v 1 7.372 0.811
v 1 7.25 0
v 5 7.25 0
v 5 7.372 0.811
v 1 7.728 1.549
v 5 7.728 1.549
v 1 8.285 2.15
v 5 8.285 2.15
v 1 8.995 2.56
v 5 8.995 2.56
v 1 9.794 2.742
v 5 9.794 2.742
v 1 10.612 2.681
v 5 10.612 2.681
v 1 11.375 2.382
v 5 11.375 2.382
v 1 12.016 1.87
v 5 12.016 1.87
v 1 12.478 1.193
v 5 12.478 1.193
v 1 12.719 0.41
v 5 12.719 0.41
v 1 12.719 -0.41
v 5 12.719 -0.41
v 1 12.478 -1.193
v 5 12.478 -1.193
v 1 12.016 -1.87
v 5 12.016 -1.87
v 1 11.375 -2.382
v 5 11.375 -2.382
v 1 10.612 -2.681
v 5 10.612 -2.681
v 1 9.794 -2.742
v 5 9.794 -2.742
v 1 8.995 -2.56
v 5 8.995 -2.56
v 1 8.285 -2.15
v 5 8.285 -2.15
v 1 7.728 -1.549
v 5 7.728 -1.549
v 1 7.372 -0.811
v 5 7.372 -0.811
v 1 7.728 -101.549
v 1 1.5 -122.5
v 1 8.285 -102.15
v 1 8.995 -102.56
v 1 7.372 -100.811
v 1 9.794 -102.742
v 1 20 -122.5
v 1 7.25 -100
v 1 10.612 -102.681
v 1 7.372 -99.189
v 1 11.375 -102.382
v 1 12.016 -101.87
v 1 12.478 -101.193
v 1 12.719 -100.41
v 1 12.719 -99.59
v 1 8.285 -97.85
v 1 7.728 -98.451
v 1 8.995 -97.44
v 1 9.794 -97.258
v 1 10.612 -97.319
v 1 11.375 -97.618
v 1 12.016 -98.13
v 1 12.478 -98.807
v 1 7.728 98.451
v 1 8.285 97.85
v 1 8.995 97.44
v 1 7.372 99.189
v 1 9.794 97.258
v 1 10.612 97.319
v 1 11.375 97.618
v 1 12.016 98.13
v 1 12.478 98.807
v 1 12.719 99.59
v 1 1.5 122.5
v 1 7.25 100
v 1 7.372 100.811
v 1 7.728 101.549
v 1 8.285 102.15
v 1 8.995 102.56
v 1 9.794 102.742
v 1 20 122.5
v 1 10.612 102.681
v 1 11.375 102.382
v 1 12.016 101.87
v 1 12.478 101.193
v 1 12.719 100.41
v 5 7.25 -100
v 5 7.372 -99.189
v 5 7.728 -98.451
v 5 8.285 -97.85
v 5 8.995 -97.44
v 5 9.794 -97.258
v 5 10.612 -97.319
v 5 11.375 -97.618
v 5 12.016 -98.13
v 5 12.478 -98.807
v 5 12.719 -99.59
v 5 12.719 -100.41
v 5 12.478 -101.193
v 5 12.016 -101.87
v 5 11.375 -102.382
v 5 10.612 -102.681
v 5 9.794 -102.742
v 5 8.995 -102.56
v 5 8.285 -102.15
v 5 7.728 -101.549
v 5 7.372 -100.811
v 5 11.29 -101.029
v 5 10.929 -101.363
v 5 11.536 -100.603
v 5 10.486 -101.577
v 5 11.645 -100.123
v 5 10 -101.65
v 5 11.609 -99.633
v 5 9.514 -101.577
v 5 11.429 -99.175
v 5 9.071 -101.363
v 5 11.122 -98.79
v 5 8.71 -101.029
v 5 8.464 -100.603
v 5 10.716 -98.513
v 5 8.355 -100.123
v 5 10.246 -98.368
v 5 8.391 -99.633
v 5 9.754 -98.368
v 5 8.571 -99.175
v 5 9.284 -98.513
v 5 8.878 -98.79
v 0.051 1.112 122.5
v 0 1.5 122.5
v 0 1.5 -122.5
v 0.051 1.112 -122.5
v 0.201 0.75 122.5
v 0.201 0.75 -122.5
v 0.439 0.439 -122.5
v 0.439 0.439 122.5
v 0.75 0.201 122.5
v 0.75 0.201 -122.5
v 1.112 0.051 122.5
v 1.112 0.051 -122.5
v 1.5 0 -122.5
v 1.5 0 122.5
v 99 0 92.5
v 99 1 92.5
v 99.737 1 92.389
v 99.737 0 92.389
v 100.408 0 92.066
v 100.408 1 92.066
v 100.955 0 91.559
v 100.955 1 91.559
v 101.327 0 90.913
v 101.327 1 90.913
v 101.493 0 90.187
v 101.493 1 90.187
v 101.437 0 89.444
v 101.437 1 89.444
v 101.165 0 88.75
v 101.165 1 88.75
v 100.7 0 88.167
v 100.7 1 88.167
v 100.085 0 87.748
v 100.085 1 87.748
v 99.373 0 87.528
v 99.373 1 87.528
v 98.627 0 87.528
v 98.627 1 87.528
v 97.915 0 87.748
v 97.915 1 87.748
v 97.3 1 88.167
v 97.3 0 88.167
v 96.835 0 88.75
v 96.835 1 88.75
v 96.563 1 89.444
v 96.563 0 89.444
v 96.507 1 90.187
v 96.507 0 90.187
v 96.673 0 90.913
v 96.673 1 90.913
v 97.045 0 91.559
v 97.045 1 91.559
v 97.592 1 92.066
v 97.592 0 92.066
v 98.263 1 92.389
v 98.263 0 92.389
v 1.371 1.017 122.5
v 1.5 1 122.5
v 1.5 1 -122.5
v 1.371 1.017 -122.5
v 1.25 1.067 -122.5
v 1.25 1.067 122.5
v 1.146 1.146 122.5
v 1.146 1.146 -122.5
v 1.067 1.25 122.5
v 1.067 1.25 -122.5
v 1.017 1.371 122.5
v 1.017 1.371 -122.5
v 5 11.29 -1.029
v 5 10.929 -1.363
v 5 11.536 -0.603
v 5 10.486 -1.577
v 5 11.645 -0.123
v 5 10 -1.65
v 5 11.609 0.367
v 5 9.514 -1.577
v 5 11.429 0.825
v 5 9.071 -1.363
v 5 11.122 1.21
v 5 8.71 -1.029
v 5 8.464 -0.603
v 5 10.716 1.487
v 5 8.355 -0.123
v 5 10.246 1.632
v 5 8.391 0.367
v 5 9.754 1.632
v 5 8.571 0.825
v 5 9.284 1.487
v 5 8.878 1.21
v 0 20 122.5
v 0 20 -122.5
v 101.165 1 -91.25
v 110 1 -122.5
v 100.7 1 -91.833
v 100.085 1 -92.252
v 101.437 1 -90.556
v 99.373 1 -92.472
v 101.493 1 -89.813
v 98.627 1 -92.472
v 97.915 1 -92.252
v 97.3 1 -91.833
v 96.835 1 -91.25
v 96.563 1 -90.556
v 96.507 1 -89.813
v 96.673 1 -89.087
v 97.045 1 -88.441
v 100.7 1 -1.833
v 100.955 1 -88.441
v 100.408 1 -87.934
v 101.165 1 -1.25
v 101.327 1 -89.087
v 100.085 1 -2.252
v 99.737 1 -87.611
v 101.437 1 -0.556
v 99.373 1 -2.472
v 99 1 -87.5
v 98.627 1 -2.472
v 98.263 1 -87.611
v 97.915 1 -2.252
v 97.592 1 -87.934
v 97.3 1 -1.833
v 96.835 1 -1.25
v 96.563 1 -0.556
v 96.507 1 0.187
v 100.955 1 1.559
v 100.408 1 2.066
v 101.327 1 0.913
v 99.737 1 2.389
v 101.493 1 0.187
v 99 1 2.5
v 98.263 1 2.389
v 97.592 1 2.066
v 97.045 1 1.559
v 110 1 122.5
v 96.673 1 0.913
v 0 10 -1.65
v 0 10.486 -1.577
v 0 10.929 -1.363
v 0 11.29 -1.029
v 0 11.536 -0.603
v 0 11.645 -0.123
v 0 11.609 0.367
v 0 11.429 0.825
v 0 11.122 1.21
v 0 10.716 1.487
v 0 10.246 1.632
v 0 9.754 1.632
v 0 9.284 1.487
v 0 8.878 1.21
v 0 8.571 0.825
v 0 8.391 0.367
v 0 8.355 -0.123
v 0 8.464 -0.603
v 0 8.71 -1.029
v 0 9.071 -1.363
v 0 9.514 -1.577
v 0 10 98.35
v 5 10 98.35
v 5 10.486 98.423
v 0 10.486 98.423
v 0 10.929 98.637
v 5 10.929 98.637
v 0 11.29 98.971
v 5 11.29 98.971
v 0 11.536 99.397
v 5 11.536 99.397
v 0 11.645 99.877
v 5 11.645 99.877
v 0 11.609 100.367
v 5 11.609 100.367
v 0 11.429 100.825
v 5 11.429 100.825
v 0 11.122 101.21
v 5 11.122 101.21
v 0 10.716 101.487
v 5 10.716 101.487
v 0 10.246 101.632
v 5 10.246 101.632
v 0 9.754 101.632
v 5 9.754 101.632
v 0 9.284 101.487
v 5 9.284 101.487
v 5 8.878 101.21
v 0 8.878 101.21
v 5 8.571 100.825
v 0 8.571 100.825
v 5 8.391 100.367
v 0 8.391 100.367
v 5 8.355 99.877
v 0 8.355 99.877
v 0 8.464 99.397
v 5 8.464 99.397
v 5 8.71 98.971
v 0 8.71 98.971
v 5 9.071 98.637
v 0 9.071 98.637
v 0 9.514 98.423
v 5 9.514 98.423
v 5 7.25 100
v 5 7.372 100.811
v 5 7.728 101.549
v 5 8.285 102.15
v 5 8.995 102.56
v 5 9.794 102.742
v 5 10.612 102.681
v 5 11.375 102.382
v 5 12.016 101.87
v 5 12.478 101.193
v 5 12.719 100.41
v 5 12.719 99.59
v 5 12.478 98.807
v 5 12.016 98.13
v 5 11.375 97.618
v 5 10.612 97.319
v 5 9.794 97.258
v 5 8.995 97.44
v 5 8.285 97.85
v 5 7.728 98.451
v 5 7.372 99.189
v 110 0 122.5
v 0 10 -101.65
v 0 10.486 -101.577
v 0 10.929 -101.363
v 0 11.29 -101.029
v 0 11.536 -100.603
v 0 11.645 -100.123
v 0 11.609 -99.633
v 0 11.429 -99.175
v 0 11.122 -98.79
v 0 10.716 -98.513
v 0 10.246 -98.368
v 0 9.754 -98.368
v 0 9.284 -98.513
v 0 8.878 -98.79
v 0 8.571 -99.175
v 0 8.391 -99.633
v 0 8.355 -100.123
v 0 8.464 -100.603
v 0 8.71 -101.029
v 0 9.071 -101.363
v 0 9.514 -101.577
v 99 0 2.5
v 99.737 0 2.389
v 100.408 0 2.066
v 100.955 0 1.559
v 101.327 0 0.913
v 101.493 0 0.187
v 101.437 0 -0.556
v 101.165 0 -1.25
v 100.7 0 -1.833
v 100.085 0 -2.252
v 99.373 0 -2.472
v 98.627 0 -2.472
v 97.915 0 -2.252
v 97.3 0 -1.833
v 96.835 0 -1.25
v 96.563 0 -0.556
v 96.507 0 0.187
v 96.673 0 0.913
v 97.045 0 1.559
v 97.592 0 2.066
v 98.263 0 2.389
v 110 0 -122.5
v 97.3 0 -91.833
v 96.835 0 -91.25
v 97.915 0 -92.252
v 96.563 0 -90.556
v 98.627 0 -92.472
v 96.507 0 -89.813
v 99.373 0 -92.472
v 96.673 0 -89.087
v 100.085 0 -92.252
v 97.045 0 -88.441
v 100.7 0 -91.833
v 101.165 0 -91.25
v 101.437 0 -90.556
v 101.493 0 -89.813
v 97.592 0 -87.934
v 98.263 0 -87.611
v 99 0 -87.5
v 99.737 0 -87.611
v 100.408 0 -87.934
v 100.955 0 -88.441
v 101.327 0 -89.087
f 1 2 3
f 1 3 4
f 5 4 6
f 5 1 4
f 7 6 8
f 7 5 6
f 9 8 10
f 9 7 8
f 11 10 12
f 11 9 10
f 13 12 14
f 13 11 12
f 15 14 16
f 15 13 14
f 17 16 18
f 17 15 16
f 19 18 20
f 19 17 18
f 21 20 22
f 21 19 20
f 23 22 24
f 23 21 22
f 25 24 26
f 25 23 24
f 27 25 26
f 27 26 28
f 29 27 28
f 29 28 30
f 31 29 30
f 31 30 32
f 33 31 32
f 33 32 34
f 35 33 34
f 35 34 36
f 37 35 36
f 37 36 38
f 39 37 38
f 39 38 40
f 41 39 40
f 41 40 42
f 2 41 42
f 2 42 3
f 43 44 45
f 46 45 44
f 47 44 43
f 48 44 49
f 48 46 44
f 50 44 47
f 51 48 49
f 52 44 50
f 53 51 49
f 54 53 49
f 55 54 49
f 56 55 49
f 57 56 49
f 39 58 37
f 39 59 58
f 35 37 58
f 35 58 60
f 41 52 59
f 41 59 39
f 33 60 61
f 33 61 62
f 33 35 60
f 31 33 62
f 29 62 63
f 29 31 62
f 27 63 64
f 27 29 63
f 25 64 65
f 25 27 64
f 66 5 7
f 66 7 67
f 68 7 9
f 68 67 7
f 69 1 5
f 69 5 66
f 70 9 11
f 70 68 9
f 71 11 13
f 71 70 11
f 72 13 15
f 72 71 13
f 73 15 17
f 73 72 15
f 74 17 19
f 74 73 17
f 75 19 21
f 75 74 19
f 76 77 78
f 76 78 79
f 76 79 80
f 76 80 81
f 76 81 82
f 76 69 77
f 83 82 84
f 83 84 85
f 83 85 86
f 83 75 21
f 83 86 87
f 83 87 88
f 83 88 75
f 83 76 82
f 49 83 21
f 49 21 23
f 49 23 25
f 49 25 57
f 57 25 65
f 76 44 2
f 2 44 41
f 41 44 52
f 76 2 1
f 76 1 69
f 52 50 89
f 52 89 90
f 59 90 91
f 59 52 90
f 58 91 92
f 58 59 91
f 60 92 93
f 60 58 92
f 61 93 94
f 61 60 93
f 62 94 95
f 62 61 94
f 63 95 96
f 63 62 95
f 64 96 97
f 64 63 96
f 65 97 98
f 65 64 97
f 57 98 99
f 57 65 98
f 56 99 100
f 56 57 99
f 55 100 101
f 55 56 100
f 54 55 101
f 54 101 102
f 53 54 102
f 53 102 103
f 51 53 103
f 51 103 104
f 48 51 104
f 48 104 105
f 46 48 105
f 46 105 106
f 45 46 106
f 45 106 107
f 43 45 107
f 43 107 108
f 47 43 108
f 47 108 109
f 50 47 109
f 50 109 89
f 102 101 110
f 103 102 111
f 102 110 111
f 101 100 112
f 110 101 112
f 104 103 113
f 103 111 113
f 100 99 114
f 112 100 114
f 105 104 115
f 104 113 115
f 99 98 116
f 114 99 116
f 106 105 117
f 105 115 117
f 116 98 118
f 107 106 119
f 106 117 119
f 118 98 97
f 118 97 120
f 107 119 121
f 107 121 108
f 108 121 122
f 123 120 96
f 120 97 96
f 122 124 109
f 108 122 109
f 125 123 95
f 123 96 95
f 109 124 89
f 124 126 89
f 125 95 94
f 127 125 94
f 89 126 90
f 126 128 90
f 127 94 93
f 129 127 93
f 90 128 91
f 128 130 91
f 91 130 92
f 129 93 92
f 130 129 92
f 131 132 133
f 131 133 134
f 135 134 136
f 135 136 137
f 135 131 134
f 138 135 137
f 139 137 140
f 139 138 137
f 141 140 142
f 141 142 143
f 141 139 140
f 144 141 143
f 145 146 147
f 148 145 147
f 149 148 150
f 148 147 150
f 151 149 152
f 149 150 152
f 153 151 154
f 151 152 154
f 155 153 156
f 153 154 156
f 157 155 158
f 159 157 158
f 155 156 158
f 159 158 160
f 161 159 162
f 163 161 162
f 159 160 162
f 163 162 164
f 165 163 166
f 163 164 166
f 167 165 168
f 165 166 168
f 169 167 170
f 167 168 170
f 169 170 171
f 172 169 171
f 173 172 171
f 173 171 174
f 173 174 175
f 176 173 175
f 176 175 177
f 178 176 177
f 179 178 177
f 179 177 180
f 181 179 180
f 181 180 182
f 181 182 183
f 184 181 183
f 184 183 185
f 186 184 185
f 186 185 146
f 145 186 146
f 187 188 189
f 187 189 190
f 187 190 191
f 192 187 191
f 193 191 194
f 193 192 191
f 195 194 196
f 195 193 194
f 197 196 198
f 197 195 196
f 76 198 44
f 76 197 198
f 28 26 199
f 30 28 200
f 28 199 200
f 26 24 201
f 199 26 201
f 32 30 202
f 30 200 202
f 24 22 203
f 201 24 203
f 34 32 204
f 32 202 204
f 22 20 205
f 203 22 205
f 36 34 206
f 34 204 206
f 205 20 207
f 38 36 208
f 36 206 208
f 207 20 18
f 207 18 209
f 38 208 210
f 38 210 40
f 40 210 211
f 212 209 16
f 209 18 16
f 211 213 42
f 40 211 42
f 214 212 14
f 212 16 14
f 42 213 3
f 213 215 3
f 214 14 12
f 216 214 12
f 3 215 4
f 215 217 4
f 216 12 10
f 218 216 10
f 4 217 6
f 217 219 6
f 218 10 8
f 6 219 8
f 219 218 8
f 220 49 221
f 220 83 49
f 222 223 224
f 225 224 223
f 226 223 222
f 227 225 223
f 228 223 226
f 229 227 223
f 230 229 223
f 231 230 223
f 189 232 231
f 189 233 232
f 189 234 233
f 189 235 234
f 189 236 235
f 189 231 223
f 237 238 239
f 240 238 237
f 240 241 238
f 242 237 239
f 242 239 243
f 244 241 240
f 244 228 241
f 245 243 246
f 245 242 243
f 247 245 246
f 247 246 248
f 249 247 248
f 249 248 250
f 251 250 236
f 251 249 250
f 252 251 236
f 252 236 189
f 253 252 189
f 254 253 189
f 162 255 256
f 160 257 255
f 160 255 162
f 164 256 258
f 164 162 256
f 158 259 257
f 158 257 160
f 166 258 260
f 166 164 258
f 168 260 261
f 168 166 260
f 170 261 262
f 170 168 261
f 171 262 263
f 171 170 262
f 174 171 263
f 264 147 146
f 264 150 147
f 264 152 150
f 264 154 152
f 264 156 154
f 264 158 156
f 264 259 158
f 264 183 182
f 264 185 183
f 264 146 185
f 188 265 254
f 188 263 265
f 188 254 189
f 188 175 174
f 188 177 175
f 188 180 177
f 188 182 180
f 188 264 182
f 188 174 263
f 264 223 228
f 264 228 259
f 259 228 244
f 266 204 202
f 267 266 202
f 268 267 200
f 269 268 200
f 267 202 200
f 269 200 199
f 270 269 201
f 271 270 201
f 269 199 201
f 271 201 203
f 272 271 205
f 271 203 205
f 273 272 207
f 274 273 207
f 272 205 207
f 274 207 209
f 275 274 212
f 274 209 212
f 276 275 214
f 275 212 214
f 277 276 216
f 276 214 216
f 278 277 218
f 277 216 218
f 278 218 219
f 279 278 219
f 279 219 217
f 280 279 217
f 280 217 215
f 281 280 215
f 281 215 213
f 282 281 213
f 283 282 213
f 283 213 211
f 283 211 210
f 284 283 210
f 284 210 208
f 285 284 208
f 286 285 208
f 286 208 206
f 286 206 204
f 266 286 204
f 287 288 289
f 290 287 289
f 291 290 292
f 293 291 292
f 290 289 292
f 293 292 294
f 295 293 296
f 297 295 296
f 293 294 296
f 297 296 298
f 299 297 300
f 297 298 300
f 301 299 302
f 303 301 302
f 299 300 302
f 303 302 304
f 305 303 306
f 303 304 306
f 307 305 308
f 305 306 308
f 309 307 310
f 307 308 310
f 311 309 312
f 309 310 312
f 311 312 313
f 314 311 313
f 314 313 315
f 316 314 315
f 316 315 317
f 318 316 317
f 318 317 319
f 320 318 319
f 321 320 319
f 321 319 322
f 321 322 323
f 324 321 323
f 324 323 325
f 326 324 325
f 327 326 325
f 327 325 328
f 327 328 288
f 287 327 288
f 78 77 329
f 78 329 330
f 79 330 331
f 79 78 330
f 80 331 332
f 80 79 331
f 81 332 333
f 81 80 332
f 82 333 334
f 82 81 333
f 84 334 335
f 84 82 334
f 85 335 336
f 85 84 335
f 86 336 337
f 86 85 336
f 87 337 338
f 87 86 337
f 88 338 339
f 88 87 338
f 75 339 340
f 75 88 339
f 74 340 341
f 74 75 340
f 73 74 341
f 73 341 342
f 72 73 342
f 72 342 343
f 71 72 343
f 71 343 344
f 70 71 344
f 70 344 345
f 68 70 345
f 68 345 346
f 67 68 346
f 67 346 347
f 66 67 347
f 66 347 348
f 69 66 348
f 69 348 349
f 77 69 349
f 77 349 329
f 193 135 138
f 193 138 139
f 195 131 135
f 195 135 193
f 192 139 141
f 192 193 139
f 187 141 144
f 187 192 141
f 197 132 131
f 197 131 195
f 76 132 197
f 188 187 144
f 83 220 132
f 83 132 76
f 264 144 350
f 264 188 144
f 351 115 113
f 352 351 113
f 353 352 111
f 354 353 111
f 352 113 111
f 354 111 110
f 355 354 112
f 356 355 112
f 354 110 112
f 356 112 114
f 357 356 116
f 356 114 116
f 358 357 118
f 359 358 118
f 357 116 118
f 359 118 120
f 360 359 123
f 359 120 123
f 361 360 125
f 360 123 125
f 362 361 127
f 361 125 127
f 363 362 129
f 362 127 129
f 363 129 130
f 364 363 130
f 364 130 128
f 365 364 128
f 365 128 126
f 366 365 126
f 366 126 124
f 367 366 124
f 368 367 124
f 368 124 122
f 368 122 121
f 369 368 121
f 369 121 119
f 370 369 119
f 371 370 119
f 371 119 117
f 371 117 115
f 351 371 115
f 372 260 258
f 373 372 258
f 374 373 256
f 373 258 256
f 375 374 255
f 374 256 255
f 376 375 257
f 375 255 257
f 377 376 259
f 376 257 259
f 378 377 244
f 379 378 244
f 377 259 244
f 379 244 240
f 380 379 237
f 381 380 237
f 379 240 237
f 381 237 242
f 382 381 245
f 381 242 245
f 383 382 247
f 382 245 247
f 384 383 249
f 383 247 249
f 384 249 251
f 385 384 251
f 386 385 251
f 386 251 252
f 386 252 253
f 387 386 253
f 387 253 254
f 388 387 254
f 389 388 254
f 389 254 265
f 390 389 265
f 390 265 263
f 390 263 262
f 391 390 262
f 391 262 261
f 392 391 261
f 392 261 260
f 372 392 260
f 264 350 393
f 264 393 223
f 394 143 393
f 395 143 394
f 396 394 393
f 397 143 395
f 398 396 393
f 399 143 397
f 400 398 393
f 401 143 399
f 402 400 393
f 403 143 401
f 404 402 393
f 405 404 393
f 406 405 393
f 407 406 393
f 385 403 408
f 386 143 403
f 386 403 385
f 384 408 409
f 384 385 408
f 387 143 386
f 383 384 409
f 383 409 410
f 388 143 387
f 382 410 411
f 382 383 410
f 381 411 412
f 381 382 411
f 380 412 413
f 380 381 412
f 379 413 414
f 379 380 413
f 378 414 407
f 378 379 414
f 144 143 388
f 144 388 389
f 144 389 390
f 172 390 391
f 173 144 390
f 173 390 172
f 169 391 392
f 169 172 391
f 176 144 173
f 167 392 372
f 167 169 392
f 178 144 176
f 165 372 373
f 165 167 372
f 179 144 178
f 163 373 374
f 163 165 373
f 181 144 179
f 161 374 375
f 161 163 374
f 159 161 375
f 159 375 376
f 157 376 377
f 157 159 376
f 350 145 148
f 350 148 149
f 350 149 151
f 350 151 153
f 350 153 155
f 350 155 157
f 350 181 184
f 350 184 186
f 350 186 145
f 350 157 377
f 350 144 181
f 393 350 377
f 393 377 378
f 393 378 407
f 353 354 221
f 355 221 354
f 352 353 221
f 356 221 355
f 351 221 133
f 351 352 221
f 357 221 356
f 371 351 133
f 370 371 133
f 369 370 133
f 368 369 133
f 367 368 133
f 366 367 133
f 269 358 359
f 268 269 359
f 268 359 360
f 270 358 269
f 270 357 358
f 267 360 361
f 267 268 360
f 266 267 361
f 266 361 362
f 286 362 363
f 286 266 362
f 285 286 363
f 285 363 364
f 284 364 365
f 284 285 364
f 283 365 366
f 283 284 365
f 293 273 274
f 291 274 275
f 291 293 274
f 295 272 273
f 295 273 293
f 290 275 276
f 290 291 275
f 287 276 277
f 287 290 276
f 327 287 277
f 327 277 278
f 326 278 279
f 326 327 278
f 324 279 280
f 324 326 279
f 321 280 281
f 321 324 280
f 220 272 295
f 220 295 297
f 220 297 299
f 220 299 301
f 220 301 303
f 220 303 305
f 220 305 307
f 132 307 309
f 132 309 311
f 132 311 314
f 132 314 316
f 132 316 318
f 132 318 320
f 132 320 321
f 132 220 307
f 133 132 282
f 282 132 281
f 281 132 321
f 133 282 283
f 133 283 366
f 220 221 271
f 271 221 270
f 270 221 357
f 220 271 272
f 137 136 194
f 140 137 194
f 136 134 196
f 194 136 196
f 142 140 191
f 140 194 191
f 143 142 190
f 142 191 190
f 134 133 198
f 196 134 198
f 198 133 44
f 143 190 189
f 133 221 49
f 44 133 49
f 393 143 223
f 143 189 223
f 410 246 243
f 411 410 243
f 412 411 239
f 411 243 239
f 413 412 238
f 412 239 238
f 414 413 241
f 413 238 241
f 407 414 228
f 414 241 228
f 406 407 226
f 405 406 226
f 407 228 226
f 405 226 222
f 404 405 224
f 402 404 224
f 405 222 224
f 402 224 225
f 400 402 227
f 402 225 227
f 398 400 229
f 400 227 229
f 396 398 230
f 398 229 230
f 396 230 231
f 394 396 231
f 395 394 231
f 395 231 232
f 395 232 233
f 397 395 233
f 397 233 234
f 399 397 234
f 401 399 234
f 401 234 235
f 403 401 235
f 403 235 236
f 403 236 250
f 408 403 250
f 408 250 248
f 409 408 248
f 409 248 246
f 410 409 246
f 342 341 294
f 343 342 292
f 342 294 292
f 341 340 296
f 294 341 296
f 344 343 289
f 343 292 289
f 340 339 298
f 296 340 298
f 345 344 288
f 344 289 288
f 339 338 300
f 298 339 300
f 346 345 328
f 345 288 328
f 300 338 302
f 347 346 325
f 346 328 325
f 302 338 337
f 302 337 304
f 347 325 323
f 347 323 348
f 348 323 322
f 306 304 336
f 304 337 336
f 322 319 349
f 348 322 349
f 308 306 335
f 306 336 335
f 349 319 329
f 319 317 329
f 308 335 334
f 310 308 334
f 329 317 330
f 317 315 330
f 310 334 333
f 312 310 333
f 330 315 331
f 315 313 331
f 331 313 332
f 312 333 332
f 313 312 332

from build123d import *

# Parameters (mm, degrees)
SM_BASE_FLANGE_1_DEPTH = 122.5
CUT_EXTRUDE_1_REACH    = 167.732
SKETCH_4_R             = 2.5
SKETCH_7_R             = 2.75
EXTRUDE_1_DEPTH        = 5
HOLE_WIZARD_M4_1_D     = 3.3
HOLE_WIZARD_M4_1_DEPTH = 10.1
HOLE_WIZARD_M4_1_TIP   = 0.991420021


# Sheet-metal steps are written as plain solids
with BuildPart() as part:
    # Sketch 1 → 基体-法兰1 (new, symmetric)
    with BuildSketch(Plane.XY):
        with BuildLine():
            Line((0, 20), (0, 1.5))
            ThreePointArc((0, 1.5), (0.439339828, 0.439339828), (1.5, 0))
            Line((1.5, 0), (110, 0))
            Line((110, 0), (110, 1))
            Line((110, 1), (1.5, 1))
            ThreePointArc((1.5, 1), (1.146446609, 1.146446609), (1, 1.5))
            Line((1, 1.5), (1, 20))
            Line((1, 20), (0, 20))
        make_face()
    extrude(amount=SM_BASE_FLANGE_1_DEPTH, both=True)

    # 草图4 → 切除-拉伸1 (cut, up to next)
    with BuildSketch(Plane(origin=(0, 1, 0), x_dir=(1, 0, 0), z_dir=(0, 1, 0)), mode=Mode.PRIVATE) as cut_extrude_1_sk1:
        with Locations(Location((99, 0, 0), (0, 0, 270))):
            Circle(SKETCH_4_R)
    cut_extrude_1_tool1 = extrude(cut_extrude_1_sk1.sketch, amount=-CUT_EXTRUDE_1_REACH, mode=Mode.PRIVATE) & part.part
    # 草图4 → 切除-拉伸1 (cut, up to next)
    with BuildSketch(Plane(origin=(0, 1, 0), x_dir=(1, 0, 0), z_dir=(0, 1, 0)), mode=Mode.PRIVATE) as cut_extrude_1_sk2:
        with Locations(Location((99, 90, 0), (0, 0, 270))):
            Circle(SKETCH_4_R)
    cut_extrude_1_tool2 = extrude(cut_extrude_1_sk2.sketch, amount=-CUT_EXTRUDE_1_REACH, mode=Mode.PRIVATE) & part.part
    # 草图4 → 切除-拉伸1 (cut, up to next)
    with BuildSketch(Plane(origin=(0, 1, 0), x_dir=(1, 0, 0), z_dir=(0, 1, 0)), mode=Mode.PRIVATE) as cut_extrude_1_sk3:
        with Locations(Location((99, -90, 0), (0, 0, 270))):
            Circle(SKETCH_4_R)
    cut_extrude_1_tool3 = extrude(cut_extrude_1_sk3.sketch, amount=-CUT_EXTRUDE_1_REACH, mode=Mode.PRIVATE) & part.part
    add(cut_extrude_1_tool1.solids().sort_by_distance((99, 1, 0))[0], mode=Mode.SUBTRACT)
    add(cut_extrude_1_tool2.solids().sort_by_distance((99, 1, -90))[0], mode=Mode.SUBTRACT)
    add(cut_extrude_1_tool3.solids().sort_by_distance((99, 1, 90))[0], mode=Mode.SUBTRACT)

    # 草图7 → 凸台-拉伸1 (add)
    with BuildSketch(Plane.ZY):
        with Locations(Location((0, 10, 0), (0, 0, 270))):
            Circle(SKETCH_7_R)
        with Locations(Location((-100, 10, 0), (0, 0, 270))):
            Circle(SKETCH_7_R)
        with Locations(Location((100, 10, 0), (0, 0, 270))):
            Circle(SKETCH_7_R)
    extrude(amount=-EXTRUDE_1_DEPTH)

    # M4 螺纹孔1
    with Locations(Plane.ZY):
        with Locations((100, 10), (0, 10), (-100, 10)):
            Hole(HOLE_WIZARD_M4_1_D / 2, depth=HOLE_WIZARD_M4_1_DEPTH)
            with Locations((0, 0, -(HOLE_WIZARD_M4_1_DEPTH + HOLE_WIZARD_M4_1_TIP / 2))):  # 118° drill point
                Cone(0, HOLE_WIZARD_M4_1_D / 2, HOLE_WIZARD_M4_1_TIP, mode=Mode.SUBTRACT)


solid = part.part
